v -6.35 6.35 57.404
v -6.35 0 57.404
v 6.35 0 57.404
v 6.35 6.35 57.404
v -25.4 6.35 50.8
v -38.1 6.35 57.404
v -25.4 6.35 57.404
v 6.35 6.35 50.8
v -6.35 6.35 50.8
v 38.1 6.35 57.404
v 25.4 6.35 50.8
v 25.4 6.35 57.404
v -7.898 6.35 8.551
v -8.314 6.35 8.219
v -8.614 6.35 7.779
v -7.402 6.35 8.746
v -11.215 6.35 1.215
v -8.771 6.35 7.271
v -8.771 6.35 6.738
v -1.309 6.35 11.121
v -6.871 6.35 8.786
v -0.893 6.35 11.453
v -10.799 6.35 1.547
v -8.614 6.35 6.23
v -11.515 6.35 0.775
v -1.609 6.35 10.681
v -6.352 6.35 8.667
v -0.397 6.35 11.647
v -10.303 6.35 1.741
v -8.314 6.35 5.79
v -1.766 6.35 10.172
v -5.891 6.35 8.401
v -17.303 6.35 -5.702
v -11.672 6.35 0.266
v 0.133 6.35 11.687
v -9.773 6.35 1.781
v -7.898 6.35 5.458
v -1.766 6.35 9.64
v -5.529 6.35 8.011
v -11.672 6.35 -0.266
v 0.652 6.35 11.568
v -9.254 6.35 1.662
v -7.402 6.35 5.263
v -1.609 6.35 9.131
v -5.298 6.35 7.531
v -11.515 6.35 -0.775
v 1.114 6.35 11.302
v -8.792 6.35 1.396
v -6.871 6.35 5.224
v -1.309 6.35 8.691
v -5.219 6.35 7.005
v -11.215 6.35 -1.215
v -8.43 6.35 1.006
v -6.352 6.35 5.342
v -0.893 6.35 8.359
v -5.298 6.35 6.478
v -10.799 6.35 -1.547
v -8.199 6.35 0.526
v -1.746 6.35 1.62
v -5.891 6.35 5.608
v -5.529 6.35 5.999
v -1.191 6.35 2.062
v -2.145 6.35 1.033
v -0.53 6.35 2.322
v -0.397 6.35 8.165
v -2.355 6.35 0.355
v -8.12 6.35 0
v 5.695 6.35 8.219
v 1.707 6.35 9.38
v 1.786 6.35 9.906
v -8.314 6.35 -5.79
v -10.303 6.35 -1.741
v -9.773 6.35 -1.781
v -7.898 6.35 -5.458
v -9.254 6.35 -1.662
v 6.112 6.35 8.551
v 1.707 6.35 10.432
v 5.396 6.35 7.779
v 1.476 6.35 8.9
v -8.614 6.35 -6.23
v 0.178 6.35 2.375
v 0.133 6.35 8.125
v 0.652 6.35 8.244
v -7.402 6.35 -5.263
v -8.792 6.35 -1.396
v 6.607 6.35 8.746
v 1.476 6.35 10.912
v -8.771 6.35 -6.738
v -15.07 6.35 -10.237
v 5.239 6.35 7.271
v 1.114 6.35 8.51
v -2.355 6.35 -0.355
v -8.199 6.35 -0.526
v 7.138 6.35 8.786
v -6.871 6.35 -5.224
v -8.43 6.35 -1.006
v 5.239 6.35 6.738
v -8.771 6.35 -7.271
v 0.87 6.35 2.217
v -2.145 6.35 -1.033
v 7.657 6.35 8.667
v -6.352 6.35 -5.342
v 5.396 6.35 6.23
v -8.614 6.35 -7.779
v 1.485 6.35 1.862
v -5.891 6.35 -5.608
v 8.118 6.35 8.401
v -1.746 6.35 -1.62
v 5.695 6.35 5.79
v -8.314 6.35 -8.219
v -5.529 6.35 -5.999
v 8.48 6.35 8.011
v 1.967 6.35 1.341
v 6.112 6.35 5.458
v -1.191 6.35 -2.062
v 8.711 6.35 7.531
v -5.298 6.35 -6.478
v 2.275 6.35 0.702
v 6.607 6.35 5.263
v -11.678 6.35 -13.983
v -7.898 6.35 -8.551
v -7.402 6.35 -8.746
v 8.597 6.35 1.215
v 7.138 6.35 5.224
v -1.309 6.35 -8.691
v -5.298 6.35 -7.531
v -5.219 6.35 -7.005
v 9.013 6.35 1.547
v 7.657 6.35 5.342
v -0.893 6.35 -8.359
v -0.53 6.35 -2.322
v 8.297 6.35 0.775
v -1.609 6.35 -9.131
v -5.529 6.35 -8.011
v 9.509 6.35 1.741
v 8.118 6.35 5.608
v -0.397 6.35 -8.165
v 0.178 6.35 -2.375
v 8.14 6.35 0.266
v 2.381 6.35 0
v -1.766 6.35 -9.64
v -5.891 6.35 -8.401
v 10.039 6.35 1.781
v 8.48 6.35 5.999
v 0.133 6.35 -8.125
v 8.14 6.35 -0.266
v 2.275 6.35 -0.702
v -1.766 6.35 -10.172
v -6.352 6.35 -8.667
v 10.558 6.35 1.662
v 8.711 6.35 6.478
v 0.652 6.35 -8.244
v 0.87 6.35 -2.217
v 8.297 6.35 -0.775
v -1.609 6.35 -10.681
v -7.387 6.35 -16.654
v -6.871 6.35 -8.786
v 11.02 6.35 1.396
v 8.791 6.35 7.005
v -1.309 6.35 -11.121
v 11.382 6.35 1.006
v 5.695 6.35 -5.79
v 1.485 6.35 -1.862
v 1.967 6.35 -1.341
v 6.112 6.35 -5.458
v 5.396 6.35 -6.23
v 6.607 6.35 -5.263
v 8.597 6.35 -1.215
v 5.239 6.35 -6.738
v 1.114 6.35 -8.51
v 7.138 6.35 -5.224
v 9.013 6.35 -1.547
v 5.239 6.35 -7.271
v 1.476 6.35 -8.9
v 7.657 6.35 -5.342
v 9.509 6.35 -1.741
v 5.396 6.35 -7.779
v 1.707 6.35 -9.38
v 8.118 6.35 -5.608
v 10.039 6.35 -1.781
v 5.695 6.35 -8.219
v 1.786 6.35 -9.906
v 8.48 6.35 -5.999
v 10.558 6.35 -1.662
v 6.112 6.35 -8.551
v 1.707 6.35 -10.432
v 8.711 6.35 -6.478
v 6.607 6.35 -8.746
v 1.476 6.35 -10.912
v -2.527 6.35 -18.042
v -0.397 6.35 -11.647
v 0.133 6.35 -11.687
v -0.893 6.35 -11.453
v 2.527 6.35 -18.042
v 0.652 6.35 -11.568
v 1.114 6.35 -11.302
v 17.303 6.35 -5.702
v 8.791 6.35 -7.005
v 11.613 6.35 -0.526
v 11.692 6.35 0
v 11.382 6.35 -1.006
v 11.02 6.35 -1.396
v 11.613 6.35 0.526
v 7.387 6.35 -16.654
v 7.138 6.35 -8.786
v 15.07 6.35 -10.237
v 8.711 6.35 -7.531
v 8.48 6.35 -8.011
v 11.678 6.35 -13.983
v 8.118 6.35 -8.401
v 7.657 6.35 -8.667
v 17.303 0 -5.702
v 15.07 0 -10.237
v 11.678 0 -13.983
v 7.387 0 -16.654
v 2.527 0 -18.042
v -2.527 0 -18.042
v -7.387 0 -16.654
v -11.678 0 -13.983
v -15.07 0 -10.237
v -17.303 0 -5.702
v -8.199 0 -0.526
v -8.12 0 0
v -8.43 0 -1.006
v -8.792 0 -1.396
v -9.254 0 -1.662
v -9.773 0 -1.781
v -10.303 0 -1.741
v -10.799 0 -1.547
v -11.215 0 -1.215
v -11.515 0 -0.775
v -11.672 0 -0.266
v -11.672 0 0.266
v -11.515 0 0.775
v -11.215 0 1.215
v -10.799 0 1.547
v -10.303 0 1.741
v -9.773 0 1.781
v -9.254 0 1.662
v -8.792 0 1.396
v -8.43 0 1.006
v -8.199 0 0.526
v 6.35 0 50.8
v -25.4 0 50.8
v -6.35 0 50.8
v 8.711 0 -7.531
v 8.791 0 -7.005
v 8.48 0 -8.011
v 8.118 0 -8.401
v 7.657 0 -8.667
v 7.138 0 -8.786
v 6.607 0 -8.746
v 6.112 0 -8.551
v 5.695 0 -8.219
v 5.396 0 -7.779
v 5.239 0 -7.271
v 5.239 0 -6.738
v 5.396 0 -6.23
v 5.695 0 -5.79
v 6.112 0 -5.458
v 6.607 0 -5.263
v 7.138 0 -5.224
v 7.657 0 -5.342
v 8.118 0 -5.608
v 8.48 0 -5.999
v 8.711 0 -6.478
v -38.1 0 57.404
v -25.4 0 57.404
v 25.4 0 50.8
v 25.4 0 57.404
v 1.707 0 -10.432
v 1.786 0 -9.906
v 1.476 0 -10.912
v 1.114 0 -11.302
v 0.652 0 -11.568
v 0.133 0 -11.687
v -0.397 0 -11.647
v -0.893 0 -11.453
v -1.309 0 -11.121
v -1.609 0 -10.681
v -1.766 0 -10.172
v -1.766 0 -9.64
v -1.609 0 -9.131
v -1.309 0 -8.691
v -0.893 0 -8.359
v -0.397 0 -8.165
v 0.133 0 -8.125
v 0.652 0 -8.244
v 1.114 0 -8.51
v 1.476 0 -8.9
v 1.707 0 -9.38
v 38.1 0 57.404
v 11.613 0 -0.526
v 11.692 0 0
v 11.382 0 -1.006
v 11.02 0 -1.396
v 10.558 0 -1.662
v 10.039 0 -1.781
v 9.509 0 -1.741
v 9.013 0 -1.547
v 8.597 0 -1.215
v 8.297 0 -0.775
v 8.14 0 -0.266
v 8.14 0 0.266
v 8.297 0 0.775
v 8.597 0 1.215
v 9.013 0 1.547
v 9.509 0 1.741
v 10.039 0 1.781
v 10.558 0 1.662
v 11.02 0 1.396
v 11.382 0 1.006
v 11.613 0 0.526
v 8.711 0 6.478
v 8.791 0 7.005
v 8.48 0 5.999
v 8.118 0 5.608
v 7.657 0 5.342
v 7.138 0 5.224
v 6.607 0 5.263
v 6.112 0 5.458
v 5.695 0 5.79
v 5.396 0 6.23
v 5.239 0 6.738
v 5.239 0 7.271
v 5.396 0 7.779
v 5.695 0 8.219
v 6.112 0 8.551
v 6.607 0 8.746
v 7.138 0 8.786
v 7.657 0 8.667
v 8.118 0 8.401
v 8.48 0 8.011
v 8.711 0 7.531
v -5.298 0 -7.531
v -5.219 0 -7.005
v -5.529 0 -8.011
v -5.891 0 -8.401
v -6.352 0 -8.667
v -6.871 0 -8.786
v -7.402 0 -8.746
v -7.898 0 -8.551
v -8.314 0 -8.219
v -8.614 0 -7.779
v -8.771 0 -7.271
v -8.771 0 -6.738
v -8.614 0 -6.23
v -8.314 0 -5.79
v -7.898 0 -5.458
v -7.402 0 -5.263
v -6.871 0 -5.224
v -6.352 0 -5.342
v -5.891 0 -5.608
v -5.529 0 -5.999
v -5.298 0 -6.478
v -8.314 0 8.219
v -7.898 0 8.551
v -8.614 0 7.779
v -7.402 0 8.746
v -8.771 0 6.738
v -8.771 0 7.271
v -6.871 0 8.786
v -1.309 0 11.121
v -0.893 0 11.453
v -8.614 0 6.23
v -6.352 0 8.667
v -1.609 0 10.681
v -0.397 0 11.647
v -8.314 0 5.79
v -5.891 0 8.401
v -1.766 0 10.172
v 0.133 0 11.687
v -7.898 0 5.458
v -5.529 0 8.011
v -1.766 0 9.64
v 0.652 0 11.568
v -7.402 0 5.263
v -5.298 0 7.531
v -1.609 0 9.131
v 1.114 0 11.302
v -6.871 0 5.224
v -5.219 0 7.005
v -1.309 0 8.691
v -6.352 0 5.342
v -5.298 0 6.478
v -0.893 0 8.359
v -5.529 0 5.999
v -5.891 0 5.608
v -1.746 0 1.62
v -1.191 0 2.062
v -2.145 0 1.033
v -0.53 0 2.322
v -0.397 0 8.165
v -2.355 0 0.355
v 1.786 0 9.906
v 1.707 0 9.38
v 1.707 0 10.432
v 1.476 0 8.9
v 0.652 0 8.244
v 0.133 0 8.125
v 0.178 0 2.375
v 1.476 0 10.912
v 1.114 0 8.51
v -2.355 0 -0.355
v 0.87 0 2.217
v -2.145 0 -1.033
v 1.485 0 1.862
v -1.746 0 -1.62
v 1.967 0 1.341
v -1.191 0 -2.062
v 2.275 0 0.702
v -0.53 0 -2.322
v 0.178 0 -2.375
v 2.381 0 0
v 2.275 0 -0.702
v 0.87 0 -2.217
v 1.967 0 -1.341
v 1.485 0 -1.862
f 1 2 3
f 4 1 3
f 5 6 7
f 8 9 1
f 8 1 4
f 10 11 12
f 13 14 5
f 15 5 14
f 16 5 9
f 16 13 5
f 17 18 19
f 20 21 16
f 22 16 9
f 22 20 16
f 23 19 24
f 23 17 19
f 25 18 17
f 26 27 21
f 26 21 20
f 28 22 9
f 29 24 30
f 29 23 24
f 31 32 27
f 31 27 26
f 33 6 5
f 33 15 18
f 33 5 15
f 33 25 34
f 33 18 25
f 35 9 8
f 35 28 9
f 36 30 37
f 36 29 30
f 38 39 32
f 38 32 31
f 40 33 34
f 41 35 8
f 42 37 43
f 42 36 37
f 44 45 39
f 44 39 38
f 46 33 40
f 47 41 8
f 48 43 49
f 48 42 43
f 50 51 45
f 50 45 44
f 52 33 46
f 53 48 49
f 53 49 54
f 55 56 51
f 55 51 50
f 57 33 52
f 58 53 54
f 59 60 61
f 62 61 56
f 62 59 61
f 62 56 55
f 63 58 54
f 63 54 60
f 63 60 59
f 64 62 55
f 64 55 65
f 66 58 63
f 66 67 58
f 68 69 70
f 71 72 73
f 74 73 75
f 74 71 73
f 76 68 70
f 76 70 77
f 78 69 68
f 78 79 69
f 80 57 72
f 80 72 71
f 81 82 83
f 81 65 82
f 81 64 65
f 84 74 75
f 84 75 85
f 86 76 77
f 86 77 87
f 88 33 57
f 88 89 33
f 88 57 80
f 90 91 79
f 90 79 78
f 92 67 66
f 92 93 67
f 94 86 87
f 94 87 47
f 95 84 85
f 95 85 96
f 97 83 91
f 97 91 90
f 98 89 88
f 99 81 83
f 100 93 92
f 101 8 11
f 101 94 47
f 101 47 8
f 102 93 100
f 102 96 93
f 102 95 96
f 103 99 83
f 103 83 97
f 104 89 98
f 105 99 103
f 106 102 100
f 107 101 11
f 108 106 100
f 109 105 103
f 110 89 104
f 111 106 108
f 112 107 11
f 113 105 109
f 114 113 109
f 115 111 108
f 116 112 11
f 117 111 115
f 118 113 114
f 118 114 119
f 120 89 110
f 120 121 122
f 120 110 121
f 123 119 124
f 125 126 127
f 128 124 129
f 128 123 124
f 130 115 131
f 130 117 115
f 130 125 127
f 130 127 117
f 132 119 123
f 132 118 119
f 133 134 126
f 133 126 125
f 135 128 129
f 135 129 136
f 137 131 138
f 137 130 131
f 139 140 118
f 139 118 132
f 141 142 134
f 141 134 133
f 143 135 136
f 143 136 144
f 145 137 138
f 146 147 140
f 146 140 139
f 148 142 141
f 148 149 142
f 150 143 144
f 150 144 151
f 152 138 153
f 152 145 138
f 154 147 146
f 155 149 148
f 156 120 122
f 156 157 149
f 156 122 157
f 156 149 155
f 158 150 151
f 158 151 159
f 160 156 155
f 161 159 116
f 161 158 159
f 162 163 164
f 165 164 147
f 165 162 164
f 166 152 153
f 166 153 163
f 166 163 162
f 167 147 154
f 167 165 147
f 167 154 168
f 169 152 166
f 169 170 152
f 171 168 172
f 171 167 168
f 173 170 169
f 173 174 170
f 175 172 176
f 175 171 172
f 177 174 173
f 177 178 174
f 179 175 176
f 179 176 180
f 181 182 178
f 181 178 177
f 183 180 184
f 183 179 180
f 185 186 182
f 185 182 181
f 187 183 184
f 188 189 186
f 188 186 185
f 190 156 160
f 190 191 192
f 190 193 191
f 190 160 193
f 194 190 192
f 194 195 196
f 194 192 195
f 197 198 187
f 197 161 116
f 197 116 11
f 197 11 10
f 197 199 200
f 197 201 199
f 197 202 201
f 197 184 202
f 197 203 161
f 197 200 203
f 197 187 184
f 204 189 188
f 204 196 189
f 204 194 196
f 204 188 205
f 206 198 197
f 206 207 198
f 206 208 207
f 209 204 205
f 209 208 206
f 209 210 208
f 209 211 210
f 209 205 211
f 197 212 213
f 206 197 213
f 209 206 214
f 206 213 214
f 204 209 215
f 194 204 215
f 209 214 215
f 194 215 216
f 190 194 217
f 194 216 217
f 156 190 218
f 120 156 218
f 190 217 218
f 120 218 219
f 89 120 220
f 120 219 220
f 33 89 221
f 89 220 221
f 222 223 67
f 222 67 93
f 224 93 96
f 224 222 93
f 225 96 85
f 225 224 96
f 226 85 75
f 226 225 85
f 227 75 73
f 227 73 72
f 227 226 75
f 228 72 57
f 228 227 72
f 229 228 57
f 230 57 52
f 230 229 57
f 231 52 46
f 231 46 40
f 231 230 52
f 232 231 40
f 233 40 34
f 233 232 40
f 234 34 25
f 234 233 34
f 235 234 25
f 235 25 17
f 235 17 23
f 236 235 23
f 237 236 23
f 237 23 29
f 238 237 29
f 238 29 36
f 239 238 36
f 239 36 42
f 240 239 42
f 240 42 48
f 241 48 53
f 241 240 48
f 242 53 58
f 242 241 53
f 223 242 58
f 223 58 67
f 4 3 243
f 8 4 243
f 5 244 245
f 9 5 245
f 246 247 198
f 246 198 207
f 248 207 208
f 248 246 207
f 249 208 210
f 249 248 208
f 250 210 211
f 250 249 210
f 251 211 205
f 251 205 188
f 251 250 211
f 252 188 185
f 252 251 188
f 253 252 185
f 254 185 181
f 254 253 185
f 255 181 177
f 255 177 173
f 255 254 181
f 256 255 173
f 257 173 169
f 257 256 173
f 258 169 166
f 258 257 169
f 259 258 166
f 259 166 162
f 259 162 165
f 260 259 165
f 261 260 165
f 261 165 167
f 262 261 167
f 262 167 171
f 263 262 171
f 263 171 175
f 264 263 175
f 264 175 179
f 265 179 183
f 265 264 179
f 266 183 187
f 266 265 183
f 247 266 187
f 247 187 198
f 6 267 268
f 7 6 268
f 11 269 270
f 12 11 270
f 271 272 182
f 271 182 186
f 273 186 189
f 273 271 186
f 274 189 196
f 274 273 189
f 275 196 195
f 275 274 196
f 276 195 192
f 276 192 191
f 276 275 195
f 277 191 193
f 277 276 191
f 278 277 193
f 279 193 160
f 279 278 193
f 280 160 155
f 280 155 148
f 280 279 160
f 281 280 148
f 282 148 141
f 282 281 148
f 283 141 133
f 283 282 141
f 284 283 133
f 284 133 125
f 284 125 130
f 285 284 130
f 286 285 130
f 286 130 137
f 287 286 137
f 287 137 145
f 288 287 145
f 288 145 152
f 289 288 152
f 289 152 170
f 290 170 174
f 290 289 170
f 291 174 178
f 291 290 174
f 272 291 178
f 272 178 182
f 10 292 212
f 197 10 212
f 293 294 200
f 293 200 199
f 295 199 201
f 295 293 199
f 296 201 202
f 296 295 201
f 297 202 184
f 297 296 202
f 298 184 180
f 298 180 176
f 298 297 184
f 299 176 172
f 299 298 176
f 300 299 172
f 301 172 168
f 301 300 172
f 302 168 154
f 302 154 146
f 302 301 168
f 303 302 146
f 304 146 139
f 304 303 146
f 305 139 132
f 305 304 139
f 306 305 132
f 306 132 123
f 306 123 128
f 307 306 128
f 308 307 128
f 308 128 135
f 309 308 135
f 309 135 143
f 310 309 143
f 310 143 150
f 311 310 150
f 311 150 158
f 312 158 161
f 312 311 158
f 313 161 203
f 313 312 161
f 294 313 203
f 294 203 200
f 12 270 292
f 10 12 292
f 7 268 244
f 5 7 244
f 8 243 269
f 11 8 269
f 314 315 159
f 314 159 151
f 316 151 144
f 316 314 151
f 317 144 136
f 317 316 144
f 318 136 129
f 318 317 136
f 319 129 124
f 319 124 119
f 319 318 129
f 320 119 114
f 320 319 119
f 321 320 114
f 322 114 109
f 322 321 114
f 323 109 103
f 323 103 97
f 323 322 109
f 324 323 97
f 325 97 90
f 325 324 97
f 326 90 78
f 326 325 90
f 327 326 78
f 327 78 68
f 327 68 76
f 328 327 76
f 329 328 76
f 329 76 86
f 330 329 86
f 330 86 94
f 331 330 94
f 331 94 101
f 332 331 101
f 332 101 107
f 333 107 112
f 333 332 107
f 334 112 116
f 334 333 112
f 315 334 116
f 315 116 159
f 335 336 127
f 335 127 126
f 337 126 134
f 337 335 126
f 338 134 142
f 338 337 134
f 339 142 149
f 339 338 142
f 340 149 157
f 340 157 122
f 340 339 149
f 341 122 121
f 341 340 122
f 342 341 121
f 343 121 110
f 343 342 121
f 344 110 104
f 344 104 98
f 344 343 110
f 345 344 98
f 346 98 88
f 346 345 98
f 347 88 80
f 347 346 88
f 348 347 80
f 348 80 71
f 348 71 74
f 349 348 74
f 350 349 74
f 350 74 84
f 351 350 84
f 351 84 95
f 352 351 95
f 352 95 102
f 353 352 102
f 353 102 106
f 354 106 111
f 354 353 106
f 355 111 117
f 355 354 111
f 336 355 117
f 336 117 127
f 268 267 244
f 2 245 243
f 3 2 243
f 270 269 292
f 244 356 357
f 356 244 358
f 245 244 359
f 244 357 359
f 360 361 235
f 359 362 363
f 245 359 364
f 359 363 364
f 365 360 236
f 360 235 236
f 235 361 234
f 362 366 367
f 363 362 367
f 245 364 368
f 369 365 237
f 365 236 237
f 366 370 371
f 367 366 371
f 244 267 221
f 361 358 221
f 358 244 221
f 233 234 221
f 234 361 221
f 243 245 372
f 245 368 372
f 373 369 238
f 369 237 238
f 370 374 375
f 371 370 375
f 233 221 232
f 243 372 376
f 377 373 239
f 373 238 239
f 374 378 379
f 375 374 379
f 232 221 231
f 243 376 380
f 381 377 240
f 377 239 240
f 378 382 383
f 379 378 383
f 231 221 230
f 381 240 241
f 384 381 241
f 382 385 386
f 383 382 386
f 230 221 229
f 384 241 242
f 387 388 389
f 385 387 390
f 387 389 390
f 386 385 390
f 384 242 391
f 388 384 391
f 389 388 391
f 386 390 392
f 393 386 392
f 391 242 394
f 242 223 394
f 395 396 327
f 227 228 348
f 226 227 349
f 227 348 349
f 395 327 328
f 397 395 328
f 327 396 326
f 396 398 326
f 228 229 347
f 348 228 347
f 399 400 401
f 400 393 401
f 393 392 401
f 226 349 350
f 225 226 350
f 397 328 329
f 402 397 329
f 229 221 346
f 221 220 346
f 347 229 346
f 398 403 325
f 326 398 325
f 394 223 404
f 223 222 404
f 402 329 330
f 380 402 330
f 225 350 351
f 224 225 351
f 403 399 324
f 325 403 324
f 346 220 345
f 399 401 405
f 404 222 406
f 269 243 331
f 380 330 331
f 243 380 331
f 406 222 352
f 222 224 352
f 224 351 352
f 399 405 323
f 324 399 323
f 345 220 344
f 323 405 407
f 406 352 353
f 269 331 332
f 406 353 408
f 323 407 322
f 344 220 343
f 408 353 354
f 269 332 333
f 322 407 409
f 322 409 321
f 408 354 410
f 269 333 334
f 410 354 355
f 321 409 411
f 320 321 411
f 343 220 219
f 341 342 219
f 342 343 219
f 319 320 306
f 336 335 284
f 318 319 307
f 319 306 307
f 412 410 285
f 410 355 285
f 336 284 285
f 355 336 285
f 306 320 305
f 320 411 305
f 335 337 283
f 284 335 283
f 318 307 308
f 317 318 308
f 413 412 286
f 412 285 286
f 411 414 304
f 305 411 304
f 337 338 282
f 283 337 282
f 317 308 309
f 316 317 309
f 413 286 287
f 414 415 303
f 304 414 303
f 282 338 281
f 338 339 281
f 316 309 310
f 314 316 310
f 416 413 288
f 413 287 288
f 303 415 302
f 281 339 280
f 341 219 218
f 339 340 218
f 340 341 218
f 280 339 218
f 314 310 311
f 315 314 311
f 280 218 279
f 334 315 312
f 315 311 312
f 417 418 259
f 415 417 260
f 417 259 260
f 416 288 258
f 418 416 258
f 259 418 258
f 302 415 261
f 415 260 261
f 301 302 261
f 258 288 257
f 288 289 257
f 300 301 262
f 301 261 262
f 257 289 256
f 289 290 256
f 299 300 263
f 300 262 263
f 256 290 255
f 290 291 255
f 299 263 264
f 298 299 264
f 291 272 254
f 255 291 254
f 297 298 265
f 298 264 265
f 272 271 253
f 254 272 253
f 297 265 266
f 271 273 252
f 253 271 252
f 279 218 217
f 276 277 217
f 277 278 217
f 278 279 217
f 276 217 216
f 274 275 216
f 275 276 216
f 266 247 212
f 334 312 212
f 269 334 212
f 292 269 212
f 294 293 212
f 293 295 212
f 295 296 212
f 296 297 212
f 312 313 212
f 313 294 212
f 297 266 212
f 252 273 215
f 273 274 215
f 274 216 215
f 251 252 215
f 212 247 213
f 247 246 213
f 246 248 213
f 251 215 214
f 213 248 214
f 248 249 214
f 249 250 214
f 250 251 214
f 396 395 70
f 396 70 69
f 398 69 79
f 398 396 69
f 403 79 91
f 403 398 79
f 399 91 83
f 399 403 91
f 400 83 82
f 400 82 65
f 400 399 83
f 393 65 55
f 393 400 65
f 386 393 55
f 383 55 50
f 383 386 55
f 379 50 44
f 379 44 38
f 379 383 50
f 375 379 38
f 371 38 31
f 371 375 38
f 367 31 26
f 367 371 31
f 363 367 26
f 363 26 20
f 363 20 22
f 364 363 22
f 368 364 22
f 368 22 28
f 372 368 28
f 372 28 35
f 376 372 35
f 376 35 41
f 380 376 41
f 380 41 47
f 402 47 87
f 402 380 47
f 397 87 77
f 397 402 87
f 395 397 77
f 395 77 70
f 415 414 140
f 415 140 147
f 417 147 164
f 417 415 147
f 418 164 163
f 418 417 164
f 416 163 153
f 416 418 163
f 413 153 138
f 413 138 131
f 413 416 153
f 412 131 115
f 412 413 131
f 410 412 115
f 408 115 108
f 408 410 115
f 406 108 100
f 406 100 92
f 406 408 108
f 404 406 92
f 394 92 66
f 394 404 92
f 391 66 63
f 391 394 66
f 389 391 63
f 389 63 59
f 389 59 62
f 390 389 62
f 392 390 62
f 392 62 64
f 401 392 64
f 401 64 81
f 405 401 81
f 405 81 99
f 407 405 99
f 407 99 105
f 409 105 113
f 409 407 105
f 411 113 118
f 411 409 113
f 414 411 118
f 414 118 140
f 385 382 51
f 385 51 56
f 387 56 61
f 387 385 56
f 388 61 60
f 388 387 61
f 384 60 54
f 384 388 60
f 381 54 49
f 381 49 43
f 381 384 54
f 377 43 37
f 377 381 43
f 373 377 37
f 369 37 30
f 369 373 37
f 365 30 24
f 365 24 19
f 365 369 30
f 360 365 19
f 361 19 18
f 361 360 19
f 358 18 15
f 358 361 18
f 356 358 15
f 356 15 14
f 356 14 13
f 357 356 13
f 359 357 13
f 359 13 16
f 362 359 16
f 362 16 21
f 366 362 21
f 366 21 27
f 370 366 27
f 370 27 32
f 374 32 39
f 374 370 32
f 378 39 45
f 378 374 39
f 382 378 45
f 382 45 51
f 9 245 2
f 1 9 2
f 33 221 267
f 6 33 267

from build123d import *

# Parameters (mm, degrees)
SKETCH1_R           = 2.38125
SKETCH1_R_2         = 1.7859375
BOSS_EXTRUDE1_DEPTH = 6.35


with BuildPart() as part:
    # Sketch1 → Boss-Extrude1 (new body)
    with BuildSketch(Plane(origin=(0, 0, 0), x_dir=(1, 0, 0), z_dir=(0, 1, 0))):
        with BuildLine():
            Line((-38.1, -57.404), (-25.4, -57.404))
            Line((-25.4, -57.404), (-25.4, -50.8))
            Line((-25.4, -50.8), (-6.35, -50.8))
            Line((-6.35, -50.8), (-6.35, -57.404))
            Line((-6.35, -57.404), (6.35, -57.404))
            Line((6.35, -57.404), (6.35, -50.8))
            Line((6.35, -50.8), (25.4, -50.8))
            Line((25.4, -50.8), (25.4, -57.404))
            Line((25.4, -57.404), (38.1, -57.404))
            Line((38.1, -57.404), (17.302924237, 5.702287964))
            ThreePointArc((17.302924237, 5.702287964), (0, 18.218322512), (-17.302924237, 5.702287964))
            Line((-17.302924237, 5.702287964), (-38.1, -57.404))
        make_face()
        Circle(SKETCH1_R, mode=Mode.SUBTRACT)
        with Locations((-9.906, 0)):
            Circle(SKETCH1_R_2, mode=Mode.SUBTRACT)
        with Locations((-7.004599774, 7.004599774)):
            Circle(SKETCH1_R_2, mode=Mode.SUBTRACT)
        with Locations((0, 9.906)):
            Circle(SKETCH1_R_2, mode=Mode.SUBTRACT)
        with Locations((7.004599774, 7.004599774)):
            Circle(SKETCH1_R_2, mode=Mode.SUBTRACT)
        with Locations((9.906, 0)):
            Circle(SKETCH1_R_2, mode=Mode.SUBTRACT)
        with Locations((7.004599774, -7.004599774)):
            Circle(SKETCH1_R_2, mode=Mode.SUBTRACT)
        with Locations((0, -9.906)):
            Circle(SKETCH1_R_2, mode=Mode.SUBTRACT)
        with Locations((-7.004599774, -7.004599774)):
            Circle(SKETCH1_R_2, mode=Mode.SUBTRACT)
    extrude(amount=BOSS_EXTRUDE1_DEPTH)


solid = part.part
